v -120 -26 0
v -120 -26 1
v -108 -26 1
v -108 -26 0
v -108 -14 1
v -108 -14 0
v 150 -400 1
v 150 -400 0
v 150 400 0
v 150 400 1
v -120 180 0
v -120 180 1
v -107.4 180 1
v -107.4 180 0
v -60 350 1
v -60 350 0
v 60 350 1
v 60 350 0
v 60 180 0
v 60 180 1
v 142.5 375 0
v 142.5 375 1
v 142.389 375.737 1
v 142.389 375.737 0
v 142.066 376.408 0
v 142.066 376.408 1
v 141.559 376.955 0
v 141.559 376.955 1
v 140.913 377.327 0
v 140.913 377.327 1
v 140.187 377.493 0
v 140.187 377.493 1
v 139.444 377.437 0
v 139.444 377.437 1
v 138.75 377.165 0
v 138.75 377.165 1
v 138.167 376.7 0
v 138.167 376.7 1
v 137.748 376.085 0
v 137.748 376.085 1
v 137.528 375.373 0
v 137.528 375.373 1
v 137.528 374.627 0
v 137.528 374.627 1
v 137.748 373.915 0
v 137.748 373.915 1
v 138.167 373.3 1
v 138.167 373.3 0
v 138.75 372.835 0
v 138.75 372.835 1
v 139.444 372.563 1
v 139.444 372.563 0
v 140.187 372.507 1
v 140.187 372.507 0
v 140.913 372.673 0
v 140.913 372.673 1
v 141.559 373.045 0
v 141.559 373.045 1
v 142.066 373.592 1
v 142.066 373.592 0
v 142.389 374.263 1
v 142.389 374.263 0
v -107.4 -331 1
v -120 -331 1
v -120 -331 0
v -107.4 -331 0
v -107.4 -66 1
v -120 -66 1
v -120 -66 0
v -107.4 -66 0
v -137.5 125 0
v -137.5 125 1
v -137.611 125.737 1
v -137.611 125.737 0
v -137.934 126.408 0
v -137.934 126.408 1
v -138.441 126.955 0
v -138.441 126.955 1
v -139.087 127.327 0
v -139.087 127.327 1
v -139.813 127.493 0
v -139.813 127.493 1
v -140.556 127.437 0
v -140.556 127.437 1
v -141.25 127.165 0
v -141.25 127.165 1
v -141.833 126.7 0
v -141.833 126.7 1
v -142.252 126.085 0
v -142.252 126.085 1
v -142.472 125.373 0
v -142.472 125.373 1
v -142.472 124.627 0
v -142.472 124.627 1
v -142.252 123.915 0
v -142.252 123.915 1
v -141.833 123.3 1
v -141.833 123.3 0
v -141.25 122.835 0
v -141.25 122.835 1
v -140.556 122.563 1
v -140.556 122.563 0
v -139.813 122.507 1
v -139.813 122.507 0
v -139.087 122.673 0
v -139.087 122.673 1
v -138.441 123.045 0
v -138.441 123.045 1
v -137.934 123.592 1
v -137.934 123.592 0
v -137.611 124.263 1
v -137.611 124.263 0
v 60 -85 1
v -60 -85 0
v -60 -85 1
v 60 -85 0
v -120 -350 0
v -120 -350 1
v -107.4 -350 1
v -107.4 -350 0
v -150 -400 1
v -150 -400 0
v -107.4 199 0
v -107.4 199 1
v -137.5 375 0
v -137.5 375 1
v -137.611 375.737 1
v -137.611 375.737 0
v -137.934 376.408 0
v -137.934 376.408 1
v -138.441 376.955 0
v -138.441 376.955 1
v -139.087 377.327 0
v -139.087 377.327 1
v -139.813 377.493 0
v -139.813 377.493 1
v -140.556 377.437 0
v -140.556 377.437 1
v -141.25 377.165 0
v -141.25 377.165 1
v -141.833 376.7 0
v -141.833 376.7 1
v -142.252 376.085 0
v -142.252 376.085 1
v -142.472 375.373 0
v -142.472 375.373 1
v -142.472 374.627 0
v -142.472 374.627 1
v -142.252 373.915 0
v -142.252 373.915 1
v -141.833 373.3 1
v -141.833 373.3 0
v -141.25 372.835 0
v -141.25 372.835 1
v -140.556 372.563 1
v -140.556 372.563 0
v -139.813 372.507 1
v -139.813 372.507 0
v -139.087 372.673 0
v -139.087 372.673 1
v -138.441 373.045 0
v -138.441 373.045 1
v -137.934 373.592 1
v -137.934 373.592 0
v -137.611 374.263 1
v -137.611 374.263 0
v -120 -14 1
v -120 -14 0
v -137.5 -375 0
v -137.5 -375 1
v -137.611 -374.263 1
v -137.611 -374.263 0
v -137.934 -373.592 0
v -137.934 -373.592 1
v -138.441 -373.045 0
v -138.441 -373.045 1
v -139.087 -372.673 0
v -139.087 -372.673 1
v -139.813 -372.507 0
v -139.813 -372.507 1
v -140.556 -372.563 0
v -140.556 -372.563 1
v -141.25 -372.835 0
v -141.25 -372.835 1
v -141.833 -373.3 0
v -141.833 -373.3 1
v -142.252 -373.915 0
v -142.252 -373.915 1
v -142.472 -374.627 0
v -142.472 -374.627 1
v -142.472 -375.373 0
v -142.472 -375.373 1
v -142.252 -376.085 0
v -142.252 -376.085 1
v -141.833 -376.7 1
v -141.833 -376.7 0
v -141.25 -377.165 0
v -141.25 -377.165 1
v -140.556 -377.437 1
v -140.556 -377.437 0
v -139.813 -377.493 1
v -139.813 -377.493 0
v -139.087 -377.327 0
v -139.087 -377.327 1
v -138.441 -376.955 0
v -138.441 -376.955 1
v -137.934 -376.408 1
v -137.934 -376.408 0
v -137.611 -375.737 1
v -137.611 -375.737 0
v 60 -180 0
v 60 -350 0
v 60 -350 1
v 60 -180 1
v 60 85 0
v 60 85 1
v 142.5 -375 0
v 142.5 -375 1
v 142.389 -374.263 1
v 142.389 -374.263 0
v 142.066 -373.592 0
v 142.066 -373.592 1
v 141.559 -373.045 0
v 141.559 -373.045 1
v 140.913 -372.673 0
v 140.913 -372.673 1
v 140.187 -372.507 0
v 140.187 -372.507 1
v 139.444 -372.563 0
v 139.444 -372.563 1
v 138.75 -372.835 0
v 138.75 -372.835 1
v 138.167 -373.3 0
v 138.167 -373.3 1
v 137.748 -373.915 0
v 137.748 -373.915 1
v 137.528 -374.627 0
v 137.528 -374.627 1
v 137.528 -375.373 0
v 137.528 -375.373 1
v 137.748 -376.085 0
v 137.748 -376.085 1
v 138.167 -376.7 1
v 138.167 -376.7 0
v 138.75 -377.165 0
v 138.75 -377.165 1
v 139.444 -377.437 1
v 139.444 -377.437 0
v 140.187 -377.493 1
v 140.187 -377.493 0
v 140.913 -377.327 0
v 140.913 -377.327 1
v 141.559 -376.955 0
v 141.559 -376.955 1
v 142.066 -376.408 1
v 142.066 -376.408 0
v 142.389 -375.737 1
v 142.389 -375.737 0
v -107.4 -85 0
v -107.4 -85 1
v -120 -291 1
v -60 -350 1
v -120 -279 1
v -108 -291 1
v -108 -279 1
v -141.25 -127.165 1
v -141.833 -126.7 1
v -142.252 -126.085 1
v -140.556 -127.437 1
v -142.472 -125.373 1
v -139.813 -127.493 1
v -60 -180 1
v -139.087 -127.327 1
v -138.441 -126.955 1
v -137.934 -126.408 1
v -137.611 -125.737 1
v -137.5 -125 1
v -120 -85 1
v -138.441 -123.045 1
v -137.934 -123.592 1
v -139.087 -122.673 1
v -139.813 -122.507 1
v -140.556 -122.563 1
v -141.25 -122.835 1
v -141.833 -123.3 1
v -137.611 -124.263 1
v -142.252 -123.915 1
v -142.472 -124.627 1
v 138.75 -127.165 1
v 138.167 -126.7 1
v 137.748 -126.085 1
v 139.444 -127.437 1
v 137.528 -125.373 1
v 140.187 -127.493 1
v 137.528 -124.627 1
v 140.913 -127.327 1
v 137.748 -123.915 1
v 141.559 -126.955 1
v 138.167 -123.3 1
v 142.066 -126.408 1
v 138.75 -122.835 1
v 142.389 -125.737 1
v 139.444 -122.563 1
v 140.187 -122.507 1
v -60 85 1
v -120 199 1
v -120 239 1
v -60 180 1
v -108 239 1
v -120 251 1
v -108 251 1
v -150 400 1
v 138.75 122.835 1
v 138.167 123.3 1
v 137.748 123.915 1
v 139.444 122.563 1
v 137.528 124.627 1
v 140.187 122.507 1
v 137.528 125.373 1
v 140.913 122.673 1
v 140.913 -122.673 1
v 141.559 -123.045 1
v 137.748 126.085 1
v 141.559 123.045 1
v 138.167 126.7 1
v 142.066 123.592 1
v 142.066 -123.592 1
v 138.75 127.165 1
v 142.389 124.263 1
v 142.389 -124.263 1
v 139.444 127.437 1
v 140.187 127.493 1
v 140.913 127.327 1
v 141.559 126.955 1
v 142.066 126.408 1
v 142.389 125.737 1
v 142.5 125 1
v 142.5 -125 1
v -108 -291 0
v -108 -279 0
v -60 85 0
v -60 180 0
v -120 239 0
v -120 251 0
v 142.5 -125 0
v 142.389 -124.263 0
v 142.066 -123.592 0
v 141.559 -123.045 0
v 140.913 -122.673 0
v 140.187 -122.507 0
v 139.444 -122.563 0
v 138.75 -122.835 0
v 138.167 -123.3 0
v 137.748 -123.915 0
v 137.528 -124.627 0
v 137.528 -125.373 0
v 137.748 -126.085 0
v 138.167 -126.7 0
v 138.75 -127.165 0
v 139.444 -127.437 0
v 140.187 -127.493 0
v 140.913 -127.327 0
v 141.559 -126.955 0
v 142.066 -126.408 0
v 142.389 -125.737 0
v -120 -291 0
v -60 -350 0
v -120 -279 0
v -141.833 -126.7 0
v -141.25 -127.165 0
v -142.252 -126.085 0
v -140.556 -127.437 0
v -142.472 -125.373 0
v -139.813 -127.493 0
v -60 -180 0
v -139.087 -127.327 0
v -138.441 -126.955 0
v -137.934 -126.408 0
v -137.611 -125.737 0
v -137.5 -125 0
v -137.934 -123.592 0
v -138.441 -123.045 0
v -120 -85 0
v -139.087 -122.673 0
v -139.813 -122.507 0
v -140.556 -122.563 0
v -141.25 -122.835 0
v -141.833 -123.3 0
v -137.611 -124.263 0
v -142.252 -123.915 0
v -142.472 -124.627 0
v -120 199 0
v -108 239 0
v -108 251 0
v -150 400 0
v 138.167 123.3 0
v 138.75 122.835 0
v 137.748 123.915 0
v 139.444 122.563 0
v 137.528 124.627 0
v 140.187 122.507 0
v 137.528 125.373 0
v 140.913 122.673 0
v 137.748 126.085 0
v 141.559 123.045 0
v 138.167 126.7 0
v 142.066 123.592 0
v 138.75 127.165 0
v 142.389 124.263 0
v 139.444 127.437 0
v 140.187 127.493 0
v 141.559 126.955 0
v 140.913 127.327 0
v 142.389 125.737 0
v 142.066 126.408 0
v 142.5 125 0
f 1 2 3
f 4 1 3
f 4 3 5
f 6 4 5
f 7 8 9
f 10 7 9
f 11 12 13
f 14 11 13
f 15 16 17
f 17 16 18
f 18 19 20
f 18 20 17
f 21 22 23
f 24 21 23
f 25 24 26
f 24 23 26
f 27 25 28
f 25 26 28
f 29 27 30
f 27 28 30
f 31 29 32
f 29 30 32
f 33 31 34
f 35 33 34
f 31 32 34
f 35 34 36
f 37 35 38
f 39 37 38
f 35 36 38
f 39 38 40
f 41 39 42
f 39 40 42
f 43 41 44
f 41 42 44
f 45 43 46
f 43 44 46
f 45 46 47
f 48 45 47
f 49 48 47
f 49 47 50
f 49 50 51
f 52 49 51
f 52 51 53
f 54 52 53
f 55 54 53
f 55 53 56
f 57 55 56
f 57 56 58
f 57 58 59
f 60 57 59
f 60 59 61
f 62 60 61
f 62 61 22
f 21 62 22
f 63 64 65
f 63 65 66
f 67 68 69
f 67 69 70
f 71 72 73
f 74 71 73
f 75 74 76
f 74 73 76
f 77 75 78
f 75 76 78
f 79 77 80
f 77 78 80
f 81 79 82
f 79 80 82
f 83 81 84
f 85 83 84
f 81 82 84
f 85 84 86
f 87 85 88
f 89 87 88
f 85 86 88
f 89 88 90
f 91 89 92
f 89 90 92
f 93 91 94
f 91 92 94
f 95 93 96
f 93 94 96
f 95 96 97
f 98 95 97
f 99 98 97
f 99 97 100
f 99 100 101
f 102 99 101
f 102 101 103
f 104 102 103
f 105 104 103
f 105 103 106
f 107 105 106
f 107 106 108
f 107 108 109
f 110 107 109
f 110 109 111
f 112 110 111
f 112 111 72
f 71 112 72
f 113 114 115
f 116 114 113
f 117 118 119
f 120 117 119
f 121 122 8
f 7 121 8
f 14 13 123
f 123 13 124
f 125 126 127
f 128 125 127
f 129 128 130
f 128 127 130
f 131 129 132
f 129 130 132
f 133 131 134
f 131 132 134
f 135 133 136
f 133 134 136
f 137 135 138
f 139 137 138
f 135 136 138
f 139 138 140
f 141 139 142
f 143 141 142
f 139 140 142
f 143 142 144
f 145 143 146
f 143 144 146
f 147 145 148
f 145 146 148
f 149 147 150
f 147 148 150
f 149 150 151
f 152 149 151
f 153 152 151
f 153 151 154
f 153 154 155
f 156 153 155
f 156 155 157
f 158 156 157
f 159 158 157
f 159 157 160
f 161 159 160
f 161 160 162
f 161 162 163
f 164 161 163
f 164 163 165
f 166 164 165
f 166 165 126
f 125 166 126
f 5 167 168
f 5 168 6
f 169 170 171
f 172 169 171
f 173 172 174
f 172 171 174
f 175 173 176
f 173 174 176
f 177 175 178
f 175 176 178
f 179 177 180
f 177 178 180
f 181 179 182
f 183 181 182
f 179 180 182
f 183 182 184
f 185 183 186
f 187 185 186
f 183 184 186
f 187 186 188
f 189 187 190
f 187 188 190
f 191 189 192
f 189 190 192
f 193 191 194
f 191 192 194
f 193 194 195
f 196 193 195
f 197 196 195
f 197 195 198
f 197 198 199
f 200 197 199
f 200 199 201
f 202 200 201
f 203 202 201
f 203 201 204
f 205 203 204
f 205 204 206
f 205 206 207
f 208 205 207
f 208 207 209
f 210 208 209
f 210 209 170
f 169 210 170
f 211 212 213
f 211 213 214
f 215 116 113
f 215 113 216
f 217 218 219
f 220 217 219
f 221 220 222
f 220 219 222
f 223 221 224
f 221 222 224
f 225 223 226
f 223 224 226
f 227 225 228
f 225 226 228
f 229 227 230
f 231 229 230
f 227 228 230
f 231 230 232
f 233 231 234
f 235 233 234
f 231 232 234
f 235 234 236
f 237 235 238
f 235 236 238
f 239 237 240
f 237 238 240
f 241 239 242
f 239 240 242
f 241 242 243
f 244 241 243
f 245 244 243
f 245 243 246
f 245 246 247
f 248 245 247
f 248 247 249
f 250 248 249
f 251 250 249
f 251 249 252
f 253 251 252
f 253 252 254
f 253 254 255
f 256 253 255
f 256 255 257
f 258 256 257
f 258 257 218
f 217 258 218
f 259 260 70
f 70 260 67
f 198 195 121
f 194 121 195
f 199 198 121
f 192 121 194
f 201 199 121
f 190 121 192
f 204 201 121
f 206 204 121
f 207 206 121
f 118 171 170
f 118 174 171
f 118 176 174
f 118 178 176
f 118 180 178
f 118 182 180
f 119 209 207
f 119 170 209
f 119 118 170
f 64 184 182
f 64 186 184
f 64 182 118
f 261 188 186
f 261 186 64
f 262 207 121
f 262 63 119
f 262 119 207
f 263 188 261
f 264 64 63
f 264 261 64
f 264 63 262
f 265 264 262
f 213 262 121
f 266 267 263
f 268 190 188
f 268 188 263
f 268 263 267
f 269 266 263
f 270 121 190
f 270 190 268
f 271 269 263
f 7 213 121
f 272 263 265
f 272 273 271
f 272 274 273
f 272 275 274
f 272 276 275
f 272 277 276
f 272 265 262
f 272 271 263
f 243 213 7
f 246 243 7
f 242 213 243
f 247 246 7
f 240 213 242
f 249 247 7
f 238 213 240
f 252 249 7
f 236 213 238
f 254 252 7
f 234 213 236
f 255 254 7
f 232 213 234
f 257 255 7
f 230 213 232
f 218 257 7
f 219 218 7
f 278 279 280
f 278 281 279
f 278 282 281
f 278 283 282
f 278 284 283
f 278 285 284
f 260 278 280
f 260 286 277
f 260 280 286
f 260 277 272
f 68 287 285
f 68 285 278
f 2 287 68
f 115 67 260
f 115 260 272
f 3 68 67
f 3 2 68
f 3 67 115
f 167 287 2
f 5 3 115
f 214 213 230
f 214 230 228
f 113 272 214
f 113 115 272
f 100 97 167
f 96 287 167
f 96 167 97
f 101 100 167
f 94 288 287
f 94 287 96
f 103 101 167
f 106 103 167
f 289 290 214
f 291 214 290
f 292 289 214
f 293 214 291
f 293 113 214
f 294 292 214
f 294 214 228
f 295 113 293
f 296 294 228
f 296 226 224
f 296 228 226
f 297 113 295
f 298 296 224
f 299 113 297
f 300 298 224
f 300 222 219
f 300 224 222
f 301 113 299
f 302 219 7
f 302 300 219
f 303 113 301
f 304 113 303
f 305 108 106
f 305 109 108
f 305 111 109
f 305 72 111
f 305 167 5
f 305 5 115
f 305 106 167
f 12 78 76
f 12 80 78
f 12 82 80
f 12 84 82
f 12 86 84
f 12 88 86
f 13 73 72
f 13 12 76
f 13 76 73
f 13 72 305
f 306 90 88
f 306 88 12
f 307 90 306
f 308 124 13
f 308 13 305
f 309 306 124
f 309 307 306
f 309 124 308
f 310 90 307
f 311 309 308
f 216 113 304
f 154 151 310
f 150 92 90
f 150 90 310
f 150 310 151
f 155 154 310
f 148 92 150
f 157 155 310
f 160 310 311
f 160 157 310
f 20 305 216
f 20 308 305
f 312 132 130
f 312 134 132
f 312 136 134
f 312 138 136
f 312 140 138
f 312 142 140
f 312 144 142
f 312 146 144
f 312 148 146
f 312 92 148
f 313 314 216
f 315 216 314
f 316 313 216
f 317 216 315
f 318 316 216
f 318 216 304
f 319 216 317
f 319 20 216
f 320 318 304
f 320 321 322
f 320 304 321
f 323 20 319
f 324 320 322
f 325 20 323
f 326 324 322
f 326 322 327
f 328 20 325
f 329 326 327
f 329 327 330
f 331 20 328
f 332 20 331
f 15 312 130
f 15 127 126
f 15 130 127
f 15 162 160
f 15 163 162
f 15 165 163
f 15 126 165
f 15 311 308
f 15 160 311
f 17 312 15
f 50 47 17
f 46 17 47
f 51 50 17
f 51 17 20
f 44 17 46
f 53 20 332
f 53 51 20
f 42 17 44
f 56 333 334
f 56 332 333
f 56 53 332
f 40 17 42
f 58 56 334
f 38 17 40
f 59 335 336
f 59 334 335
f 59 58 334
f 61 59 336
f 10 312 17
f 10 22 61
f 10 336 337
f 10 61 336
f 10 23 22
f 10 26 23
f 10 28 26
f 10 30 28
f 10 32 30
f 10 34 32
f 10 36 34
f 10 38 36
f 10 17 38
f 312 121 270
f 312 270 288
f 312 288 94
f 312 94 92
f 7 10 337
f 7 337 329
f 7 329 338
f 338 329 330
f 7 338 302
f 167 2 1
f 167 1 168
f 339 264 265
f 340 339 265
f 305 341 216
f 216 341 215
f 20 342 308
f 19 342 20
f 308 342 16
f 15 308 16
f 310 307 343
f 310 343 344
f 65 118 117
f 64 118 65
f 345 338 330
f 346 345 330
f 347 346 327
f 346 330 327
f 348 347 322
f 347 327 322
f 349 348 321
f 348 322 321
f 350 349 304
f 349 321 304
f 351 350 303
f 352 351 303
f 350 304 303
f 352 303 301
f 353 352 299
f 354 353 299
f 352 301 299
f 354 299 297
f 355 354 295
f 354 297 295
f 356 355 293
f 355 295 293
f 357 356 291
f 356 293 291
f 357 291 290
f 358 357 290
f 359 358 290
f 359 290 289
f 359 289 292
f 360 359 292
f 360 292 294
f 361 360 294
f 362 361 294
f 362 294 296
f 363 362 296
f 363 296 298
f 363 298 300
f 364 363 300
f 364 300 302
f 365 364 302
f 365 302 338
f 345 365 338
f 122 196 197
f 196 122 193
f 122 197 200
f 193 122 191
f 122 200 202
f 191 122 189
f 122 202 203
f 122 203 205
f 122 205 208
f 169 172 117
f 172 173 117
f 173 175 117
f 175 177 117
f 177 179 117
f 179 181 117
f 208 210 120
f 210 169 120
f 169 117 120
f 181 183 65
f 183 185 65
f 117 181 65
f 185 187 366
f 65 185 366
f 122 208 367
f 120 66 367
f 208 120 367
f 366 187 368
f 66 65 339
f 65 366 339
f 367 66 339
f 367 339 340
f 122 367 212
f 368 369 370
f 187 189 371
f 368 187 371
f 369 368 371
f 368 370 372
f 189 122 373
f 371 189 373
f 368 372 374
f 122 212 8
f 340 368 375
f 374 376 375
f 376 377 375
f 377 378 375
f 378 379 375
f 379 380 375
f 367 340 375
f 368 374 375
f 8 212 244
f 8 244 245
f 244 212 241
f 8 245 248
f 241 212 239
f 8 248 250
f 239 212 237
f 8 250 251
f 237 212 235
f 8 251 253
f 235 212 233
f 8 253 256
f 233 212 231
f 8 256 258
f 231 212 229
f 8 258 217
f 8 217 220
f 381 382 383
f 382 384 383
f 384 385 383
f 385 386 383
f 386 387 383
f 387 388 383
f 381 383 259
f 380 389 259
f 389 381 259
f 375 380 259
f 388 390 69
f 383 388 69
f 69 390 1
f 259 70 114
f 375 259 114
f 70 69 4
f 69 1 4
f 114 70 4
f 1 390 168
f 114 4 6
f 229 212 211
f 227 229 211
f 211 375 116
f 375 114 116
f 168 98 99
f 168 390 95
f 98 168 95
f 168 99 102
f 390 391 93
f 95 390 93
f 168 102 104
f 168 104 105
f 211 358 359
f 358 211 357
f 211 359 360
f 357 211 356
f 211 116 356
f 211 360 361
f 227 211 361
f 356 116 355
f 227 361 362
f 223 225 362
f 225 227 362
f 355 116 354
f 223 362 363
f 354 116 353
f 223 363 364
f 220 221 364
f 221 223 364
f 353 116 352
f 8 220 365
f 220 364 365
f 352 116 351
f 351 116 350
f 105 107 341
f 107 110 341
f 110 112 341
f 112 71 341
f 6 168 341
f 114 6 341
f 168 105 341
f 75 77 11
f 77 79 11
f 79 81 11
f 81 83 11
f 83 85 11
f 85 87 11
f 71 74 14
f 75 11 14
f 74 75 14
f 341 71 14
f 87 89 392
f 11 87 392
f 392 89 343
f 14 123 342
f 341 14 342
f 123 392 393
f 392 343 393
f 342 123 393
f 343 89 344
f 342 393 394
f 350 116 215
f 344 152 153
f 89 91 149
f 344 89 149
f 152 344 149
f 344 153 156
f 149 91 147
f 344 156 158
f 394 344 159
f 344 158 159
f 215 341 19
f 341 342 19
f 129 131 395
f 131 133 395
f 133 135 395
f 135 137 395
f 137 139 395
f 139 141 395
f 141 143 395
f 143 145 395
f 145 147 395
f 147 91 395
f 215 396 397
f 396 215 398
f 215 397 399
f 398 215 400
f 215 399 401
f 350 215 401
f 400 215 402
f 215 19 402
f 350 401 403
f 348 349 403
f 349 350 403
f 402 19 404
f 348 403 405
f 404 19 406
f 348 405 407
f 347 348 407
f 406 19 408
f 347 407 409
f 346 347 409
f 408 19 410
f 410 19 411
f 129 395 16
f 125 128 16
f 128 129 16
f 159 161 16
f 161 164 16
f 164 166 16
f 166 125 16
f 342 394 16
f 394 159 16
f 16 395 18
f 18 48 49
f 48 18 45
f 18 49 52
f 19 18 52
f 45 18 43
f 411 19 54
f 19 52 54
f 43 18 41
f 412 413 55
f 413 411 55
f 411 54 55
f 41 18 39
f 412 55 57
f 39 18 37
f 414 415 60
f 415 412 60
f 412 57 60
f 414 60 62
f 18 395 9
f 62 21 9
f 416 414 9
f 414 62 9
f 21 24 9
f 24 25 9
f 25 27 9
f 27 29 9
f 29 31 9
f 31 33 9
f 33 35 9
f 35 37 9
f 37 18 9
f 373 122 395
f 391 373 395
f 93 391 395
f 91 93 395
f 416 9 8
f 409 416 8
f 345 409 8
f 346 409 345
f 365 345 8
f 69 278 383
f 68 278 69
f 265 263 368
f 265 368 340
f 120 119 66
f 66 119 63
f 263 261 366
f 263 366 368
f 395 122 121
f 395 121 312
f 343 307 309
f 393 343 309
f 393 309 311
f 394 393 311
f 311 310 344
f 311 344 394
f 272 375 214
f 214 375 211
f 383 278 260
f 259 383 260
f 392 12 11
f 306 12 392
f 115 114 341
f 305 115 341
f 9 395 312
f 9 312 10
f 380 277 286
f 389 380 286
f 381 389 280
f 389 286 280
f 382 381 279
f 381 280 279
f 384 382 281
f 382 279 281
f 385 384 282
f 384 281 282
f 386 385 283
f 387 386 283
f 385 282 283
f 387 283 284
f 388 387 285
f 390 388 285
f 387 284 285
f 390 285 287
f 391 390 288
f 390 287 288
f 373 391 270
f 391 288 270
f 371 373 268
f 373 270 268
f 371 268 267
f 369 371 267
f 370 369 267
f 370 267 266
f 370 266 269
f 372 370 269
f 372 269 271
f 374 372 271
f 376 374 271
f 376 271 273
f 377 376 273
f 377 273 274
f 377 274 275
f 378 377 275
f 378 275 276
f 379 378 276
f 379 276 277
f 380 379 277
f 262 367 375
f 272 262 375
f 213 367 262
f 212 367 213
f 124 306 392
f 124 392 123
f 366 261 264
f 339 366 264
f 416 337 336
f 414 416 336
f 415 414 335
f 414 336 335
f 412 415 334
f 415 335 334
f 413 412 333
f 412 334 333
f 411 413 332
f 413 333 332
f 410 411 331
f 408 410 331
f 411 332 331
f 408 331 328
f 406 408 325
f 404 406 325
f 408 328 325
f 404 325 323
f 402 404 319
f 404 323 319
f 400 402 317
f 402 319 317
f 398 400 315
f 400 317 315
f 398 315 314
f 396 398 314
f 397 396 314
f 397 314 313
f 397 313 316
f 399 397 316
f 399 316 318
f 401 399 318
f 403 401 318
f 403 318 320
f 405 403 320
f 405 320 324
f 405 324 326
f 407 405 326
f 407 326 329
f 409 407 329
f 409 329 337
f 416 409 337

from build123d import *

# Parameters (mm, degrees)
SKETCH1_W           = 300
SKETCH1_H           = 800
SKETCH1_W_2         = 120
SKETCH1_H_2         = 170
BOSS_EXTRUDE1_DEPTH = 1
SKETCH4_R           = 2.5
CUT_EXTRUDE1_DEPTH  = 10
SKETCH5_W           = 12.6
SKETCH5_H           = 19
SKETCH5_W_2         = 12
SKETCH5_H_2         = 12
CUT_EXTRUDE2_DEPTH  = 10


with BuildPart() as part:
    # Sketch1 → Boss-Extrude1 (new body)
    with BuildSketch(Plane.XY):
        Rectangle(SKETCH1_W, SKETCH1_H)
        Rectangle(SKETCH1_W_2, SKETCH1_H_2, mode=Mode.SUBTRACT)
        with Locations((0, 265)):
            Rectangle(SKETCH1_W_2, SKETCH1_H_2, mode=Mode.SUBTRACT)
        with Locations((0, -265)):
            Rectangle(SKETCH1_W_2, SKETCH1_H_2, mode=Mode.SUBTRACT)
    extrude(amount=BOSS_EXTRUDE1_DEPTH)

    # Sketch4 → Cut-Extrude1 (cut)
    with BuildSketch(Plane.XY.offset(1)):
        with Locations((140, 375)):
            Circle(SKETCH4_R)
        with Locations((-140, 375)):
            Circle(SKETCH4_R)
        with Locations((-140, 125)):
            Circle(SKETCH4_R)
        with Locations((-140, -125)):
            Circle(SKETCH4_R)
        with Locations((-140, -375)):
            Circle(SKETCH4_R)
        with Locations((140, 125)):
            Circle(SKETCH4_R)
        with Locations((140, -125)):
            Circle(SKETCH4_R)
        with Locations((140, -375)):
            Circle(SKETCH4_R)
    extrude(amount=-CUT_EXTRUDE1_DEPTH, mode=Mode.SUBTRACT)

    # Sketch5 → Cut-Extrude2 (cut)
    with BuildSketch(Plane.XY.offset(1)):
        with Locations((-113.7, 189.5)):
            Rectangle(SKETCH5_W, SKETCH5_H)
        with Locations((-113.7, -75.5)):
            Rectangle(SKETCH5_W, SKETCH5_H)
        with Locations((-113.7, -340.5)):
            Rectangle(SKETCH5_W, SKETCH5_H)
        with Locations((-114, -20)):
            Rectangle(SKETCH5_W_2, SKETCH5_H_2)
        with Locations((-114, 245)):
            Rectangle(SKETCH5_W_2, SKETCH5_H_2)
        with Locations((-114, -285)):
            Rectangle(SKETCH5_W_2, SKETCH5_H_2)
    extrude(amount=-CUT_EXTRUDE2_DEPTH, mode=Mode.SUBTRACT)


solid = part.part
